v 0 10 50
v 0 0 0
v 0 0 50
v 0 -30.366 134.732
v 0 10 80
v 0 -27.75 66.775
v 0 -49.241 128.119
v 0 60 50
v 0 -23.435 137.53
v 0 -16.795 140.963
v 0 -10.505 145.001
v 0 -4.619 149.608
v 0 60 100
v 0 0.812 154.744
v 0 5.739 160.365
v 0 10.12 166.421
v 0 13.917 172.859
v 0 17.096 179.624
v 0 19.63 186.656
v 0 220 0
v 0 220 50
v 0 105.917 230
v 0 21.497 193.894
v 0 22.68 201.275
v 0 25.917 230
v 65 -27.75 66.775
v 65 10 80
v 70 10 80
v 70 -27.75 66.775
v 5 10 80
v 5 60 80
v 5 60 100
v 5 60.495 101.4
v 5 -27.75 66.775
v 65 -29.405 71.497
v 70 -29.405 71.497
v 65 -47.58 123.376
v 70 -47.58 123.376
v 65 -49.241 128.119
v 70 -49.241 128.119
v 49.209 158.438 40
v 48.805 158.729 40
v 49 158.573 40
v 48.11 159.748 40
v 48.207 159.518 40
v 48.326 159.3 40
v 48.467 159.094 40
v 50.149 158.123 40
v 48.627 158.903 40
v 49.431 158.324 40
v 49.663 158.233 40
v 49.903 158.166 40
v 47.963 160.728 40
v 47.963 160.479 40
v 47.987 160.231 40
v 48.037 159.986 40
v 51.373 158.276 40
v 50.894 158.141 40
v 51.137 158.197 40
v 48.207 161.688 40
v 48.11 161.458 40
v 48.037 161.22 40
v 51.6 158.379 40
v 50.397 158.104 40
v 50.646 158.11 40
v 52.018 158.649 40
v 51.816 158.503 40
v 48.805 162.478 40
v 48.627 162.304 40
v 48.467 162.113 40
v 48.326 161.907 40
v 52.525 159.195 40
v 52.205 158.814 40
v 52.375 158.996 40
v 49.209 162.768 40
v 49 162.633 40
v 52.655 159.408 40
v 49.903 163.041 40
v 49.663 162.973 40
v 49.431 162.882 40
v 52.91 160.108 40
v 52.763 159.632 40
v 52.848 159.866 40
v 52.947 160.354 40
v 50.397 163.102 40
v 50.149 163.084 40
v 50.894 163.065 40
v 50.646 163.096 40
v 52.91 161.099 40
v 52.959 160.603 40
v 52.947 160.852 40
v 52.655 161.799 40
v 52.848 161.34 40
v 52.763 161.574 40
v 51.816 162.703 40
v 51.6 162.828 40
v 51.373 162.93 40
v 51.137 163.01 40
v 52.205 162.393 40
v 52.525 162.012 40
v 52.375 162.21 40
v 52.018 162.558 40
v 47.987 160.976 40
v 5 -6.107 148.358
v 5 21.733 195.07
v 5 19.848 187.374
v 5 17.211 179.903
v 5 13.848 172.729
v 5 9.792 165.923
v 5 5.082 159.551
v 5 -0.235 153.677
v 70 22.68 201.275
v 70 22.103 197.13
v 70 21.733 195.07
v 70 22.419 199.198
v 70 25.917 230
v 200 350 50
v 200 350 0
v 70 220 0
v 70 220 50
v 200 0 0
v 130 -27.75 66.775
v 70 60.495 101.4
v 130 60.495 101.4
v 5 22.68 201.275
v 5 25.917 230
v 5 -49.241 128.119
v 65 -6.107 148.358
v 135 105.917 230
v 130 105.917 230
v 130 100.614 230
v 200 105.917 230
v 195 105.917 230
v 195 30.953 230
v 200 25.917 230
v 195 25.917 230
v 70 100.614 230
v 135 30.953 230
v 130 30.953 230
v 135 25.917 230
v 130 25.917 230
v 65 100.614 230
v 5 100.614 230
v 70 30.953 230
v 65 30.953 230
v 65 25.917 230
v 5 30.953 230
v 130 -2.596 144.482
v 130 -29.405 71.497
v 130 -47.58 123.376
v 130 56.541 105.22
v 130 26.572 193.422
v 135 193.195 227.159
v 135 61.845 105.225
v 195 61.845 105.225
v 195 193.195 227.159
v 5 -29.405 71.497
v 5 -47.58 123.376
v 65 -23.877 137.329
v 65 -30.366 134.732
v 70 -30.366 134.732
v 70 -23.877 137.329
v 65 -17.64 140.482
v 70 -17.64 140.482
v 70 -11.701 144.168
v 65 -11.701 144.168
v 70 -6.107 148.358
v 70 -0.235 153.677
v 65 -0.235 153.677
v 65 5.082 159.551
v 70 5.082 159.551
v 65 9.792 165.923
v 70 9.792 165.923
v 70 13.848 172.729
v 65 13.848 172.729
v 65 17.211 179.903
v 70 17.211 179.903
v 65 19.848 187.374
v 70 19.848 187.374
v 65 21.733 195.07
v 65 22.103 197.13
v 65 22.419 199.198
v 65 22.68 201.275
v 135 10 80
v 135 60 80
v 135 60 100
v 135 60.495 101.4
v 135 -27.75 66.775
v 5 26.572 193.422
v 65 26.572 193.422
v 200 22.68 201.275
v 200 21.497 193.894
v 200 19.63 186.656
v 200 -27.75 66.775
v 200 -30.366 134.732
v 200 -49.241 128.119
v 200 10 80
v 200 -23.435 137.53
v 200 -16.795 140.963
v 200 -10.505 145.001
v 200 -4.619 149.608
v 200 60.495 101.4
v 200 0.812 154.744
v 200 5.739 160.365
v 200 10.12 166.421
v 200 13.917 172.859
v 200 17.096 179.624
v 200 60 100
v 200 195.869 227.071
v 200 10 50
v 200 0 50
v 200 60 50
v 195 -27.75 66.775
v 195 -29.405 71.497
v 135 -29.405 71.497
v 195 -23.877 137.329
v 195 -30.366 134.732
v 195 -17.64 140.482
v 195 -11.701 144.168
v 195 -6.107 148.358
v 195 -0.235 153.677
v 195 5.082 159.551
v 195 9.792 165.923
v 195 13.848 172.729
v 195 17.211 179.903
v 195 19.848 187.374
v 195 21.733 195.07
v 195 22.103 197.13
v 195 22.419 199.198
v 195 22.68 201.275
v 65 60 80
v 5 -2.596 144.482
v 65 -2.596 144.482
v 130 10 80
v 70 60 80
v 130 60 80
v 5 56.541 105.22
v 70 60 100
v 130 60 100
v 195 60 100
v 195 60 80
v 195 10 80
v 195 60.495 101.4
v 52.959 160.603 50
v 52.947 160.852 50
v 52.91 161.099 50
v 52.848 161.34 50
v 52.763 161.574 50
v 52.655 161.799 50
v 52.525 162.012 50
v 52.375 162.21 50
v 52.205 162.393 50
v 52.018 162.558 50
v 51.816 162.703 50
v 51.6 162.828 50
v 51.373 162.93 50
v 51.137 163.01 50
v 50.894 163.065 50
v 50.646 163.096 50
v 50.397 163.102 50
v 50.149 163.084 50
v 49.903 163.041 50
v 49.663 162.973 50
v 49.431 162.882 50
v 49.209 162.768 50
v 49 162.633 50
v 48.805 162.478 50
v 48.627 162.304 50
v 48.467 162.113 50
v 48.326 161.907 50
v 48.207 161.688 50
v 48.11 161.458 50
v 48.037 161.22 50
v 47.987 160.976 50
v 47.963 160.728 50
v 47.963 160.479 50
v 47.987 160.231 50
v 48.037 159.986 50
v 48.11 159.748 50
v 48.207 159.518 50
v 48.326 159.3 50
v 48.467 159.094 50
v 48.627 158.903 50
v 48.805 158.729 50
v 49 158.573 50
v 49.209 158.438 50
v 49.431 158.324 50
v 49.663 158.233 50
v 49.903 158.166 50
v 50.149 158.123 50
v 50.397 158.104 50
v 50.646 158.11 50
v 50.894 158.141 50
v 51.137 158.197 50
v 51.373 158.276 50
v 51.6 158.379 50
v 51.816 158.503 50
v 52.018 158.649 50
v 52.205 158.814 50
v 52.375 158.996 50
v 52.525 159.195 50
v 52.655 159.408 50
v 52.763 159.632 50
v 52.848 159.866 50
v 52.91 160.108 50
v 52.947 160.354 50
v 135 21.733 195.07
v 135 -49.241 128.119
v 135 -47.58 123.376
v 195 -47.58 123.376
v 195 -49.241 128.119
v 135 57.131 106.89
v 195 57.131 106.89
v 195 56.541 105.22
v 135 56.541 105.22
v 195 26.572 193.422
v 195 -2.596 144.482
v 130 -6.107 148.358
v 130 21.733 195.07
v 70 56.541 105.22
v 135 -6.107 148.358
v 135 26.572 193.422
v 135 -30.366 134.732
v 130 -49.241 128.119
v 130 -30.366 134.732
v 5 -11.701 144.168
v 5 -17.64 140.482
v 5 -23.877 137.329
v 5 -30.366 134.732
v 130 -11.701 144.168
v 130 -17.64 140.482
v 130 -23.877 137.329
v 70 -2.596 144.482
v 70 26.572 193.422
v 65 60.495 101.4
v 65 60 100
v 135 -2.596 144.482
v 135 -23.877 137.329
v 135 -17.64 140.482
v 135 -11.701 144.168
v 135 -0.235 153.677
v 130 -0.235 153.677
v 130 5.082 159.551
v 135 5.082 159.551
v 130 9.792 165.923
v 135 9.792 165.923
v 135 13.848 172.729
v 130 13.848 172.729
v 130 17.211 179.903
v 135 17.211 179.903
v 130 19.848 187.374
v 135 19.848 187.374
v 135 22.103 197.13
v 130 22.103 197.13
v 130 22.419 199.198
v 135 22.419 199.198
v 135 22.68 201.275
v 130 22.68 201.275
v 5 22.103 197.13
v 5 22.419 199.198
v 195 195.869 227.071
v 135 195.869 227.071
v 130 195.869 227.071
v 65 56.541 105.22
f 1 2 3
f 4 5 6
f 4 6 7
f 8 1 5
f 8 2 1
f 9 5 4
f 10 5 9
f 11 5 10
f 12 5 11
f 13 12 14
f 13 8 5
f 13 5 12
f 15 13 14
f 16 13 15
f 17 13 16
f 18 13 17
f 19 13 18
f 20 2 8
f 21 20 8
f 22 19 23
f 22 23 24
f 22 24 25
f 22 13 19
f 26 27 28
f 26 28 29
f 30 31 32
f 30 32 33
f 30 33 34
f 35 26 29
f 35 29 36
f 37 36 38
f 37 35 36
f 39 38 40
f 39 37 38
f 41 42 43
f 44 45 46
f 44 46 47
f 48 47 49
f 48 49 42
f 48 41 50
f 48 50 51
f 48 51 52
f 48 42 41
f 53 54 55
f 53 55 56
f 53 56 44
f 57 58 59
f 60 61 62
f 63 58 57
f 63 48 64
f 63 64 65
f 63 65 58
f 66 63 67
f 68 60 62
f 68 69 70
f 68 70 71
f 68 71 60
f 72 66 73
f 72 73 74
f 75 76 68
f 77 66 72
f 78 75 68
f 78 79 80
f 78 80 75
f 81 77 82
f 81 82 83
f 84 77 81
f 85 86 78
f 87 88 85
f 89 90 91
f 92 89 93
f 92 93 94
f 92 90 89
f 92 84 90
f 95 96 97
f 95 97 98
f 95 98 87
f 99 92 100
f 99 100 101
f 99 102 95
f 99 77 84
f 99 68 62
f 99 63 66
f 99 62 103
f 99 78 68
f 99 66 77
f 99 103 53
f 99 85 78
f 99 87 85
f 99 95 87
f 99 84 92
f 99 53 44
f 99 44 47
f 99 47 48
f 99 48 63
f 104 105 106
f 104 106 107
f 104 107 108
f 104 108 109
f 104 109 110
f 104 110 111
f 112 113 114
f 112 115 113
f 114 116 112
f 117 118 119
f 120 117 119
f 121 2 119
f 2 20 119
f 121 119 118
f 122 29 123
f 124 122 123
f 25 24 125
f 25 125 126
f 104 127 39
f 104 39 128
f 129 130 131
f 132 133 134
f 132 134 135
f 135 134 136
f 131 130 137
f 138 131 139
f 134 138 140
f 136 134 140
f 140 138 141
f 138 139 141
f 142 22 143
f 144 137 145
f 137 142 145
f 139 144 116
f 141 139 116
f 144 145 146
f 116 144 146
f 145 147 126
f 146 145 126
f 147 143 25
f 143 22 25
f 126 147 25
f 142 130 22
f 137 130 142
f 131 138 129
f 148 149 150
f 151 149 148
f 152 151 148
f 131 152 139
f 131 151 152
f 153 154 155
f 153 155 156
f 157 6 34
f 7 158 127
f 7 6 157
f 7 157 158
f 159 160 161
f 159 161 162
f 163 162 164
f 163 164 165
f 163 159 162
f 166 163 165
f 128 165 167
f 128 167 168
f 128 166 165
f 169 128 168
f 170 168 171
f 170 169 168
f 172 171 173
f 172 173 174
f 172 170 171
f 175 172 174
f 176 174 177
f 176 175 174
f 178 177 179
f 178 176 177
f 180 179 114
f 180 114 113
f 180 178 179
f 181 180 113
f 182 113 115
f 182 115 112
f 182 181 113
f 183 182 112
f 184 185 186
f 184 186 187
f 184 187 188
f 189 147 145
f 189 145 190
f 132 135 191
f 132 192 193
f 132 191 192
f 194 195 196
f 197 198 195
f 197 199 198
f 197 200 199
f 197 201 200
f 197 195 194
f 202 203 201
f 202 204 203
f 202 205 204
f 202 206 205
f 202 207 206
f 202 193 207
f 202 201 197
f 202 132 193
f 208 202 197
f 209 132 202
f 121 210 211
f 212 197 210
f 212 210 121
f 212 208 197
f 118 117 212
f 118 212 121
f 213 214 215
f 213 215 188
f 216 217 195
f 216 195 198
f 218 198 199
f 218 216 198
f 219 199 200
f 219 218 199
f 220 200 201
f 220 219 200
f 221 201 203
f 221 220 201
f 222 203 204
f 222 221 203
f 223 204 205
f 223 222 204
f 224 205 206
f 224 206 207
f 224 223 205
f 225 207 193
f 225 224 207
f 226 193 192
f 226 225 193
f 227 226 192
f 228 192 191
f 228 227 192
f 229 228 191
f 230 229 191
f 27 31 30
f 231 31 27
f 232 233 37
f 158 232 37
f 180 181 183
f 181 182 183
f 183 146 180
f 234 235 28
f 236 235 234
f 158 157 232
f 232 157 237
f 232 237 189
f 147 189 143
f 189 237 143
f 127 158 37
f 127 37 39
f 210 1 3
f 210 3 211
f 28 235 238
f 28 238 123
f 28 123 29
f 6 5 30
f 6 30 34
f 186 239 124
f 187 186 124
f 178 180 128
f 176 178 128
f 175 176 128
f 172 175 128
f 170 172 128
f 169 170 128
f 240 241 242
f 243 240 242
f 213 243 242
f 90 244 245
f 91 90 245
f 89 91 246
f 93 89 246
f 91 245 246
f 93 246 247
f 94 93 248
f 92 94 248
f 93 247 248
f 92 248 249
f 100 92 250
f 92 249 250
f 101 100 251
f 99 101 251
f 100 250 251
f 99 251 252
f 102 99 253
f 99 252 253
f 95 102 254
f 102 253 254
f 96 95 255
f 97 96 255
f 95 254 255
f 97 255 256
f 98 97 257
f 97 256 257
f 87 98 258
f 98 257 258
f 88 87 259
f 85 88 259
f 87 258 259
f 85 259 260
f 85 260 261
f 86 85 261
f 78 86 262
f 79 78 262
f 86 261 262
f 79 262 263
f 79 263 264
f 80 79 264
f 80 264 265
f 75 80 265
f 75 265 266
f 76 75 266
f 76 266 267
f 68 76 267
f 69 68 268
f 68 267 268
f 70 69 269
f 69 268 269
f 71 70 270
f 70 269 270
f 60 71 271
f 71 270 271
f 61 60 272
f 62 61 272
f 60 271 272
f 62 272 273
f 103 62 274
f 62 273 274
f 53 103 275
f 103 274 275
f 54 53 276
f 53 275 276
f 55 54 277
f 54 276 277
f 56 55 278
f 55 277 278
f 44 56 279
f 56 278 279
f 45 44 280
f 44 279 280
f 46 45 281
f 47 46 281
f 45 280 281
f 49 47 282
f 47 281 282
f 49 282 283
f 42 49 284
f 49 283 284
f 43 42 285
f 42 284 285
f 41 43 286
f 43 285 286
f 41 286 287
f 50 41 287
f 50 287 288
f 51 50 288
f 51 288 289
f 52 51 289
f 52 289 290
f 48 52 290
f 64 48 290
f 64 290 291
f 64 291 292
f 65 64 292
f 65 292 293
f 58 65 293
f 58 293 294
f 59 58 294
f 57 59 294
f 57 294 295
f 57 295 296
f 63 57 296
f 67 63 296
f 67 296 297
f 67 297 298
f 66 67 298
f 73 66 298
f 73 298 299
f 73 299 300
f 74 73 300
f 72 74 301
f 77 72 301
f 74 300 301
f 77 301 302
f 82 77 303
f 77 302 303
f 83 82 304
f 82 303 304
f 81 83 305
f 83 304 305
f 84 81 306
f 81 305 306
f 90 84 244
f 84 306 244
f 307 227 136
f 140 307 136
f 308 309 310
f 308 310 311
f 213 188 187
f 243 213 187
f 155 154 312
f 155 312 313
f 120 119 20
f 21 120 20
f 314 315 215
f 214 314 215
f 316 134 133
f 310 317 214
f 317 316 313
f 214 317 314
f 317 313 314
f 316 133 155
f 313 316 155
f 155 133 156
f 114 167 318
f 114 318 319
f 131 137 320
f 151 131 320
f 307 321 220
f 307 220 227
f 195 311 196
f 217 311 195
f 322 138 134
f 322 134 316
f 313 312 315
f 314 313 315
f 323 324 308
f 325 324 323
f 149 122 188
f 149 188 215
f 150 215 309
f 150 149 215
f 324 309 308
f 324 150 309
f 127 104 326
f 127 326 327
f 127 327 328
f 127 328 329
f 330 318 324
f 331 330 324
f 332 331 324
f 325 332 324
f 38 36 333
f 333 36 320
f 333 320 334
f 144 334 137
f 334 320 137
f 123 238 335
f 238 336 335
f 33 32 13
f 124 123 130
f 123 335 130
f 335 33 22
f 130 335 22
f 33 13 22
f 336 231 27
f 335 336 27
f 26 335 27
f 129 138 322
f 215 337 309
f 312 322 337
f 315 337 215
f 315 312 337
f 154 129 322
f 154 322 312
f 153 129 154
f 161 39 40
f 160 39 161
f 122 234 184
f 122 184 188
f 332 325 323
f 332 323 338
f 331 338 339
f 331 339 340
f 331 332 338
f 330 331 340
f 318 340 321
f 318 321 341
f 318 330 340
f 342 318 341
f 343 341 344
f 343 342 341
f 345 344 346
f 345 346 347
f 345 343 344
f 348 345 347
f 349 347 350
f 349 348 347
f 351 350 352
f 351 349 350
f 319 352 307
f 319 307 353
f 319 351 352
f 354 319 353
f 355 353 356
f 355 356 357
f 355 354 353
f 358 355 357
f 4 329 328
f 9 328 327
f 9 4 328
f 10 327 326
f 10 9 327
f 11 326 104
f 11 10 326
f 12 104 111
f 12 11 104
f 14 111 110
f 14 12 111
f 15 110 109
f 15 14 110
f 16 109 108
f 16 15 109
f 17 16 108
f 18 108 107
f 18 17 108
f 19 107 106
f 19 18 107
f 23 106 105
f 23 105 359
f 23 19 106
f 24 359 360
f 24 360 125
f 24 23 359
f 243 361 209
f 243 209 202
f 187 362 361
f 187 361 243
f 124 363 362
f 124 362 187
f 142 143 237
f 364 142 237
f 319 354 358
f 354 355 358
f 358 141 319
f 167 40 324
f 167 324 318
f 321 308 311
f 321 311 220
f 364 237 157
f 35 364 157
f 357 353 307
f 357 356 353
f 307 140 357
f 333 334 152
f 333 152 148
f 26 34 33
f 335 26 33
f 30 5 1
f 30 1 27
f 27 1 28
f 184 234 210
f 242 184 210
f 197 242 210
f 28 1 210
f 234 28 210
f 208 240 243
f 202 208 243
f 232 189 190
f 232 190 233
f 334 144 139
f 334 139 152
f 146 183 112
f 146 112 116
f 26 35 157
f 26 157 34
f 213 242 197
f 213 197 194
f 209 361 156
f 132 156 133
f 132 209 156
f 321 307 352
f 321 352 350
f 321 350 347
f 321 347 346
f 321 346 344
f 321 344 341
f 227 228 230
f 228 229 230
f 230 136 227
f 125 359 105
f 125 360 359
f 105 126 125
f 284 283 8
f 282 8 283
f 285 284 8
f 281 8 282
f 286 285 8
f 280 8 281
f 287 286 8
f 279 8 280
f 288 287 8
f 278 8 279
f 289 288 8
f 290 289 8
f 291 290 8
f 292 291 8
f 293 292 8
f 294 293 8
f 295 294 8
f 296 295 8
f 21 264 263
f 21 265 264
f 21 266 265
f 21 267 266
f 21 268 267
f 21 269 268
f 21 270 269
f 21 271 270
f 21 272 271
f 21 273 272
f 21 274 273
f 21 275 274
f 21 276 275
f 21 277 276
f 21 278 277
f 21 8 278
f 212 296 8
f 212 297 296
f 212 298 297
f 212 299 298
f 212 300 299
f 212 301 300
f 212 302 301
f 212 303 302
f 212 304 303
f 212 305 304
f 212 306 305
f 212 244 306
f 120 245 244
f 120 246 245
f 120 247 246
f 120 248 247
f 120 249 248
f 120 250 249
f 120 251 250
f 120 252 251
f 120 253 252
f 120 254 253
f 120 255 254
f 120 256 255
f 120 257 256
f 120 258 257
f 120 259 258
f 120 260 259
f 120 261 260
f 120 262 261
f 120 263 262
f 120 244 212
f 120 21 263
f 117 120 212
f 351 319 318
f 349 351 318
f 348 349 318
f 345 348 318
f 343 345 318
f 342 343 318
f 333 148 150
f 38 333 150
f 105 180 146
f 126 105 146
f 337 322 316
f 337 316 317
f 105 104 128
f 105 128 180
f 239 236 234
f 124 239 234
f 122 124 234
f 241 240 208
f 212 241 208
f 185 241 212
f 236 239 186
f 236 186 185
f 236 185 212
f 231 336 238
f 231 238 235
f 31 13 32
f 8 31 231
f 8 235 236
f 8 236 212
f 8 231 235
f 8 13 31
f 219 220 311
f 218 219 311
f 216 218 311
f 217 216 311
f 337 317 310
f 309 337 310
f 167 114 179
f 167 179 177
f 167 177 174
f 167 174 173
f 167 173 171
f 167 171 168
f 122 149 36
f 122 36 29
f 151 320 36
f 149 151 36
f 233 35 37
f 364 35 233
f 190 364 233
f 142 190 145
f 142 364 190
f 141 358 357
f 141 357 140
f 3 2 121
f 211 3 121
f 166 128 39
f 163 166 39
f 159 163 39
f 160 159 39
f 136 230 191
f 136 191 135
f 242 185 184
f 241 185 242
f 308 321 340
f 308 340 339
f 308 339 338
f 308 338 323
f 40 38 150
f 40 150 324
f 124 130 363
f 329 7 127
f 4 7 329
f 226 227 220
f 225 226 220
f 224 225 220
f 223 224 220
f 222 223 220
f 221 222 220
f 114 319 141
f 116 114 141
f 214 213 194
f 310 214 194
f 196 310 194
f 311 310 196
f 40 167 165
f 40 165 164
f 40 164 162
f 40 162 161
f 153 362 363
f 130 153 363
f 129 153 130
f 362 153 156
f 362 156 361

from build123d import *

# Parameters (mm, degrees)
P_IDAT_VYSUNUT_M1_DEPTH  = 50
SKICA7_W                 = 200
SKICA7_H                 = 50
P_IDAT_VYSUNUT_M5_DEPTH  = 30
P_IDAT_VYSUNUT_M6_DEPTH  = 5
LINPOLE1_COUNT           = 4
LINPOLE1_PITCH           = 65
P_IDAT_VYSUNUT_M10_DEPTH = 60
LINPOLE3_COUNT           = 3
LINPOLE3_PITCH           = 65
SKICA17_W                = 60
SKICA17_H                = 132.33
ODEBRAT_VYSUNUT_M3_DEPTH = 10
P_IDAT_VYSUNUT_M12_DEPTH = 5
LINPOLE4_COUNT           = 2
LINPOLE4_PITCH           = 65
P_IDAT_VYSUNUT_M13_DEPTH = 60
SKICA20_R                = 2.5
ODEBRAT_VYSUNUT_M4_DEPTH = 10


with BuildPart() as part:
    # Skica1 → Přidat vysunutím1 (new body)
    with BuildSketch(Plane.XY):
        Polygon((0, 0), (200, 0), (200, 350), (70, 220), (0, 220), align=None)
    extrude(amount=P_IDAT_VYSUNUT_M1_DEPTH)

    # Skica7 → Přidat vysunutím5 (add)
    with BuildSketch(Plane.XY.offset(50)):
        with Locations((100, 35)):
            Rectangle(SKICA7_W, SKICA7_H)
    extrude(amount=P_IDAT_VYSUNUT_M5_DEPTH)

    # Skica9 → Přidat vysunutím6 (add)
    with BuildSketch(Plane.ZY):
        with BuildLine():
            Line((80, 10), (66.774778957, -27.75041097))
            Line((66.774778957, -27.75041097), (128.119196783, -49.241395164))
            Line((128.119196783, -49.241395164), (134.731807304, -30.366189679))
            ThreePointArc((134.731807304, -30.366189679), (160.364777666, 5.738922578), (201.274673199, 22.680255114))
            Line((201.274673199, 22.680255114), (230, 25.917114128))
            Line((230, 25.917114128), (230, 105.917114128))
            Line((230, 105.917114128), (100, 60))
            Line((100, 60), (80, 60))
            Line((80, 60), (80, 10))
        make_face()
    p_idat_vysunut_m6 = extrude(amount=-P_IDAT_VYSUNUT_M6_DEPTH)

    # LinPole1: Přidat vysunutím6 ×4
    with Locations(*[(i * LINPOLE1_PITCH, 0, 0) for i in range(1, LINPOLE1_COUNT)]):
        add(p_idat_vysunut_m6)

    # Skica12 → Přidat vysunutím10 (add)
    with BuildSketch(Plane(origin=(5, 0, 0), x_dir=(0, 0, -1), z_dir=(1, 0, 0))):
        Polygon((-230, 105.917114128), (-230, 100.61438772), (-105.220267206, 56.541116708), (-71.496803297, -29.404692713), (-66.774778957, -27.75041097), (-101.40042077, 60.494640618), align=None)
        Polygon((-230, 25.917114128), (-230, 30.952852669), (-193.421577993, 26.571602615), (-144.481791005, -2.596155027), (-123.37587339, -47.579651656), (-128.119196783, -49.241395164), (-148.357587613, -6.10687705), (-195.069843452, 21.733288203), align=None)
    p_idat_vysunut_m10 = extrude(amount=P_IDAT_VYSUNUT_M10_DEPTH)

    # LinPole3: Přidat vysunutím10 ×3
    with Locations(*[(i * LINPOLE3_PITCH, 0, 0) for i in range(1, LINPOLE3_COUNT)]):
        add(p_idat_vysunut_m10)

    # Skica17 → Odebrat vysunutím3 (cut)
    with BuildSketch(Plane(origin=(0, 21.941769172, -7.750020917), x_dir=(1, 0, 0), z_dir=(0, 0.9429111773554218, -0.33304430879120595))):
        with Locations((165, -185.979662856)):
            Rectangle(SKICA17_W, SKICA17_H)
    extrude(amount=-ODEBRAT_VYSUNUT_M3_DEPTH, mode=Mode.SUBTRACT)

    # Skica18 → Přidat vysunutím12 (add)
    with BuildSketch(Plane(origin=(135, 0, 0), x_dir=(0, 0, -1), z_dir=(1, 0, 0))):
        Polygon((-101.40042077, 60.494640618), (-227.071424446, 195.869453982), (-230, 105.917114128), align=None)
    p_idat_vysunut_m12 = extrude(amount=-P_IDAT_VYSUNUT_M12_DEPTH)

    # LinPole4: Přidat vysunutím12 ×2
    with Locations(*[(i * LINPOLE4_PITCH, 0, 0) for i in range(1, LINPOLE4_COUNT)]):
        add(p_idat_vysunut_m12)

    # Skica19 → Přidat vysunutím13 (add)
    with BuildSketch(Plane(origin=(135, 0, 0), x_dir=(0, 0, -1), z_dir=(1, 0, 0))):
        Polygon((-227.071424446, 195.869453982), (-101.40042077, 60.494640618), (-105.224563901, 61.845360745), (-227.158510983, 193.194557029), align=None)
    extrude(amount=P_IDAT_VYSUNUT_M13_DEPTH)

    # Skica20 → Odebrat vysunutím4 (cut)
    with BuildSketch(Plane.XY.offset(50)):
        with Locations((50.459484354, 160.603206666)):
            Circle(SKICA20_R)
    extrude(amount=-ODEBRAT_VYSUNUT_M4_DEPTH, mode=Mode.SUBTRACT)


solid = part.part
